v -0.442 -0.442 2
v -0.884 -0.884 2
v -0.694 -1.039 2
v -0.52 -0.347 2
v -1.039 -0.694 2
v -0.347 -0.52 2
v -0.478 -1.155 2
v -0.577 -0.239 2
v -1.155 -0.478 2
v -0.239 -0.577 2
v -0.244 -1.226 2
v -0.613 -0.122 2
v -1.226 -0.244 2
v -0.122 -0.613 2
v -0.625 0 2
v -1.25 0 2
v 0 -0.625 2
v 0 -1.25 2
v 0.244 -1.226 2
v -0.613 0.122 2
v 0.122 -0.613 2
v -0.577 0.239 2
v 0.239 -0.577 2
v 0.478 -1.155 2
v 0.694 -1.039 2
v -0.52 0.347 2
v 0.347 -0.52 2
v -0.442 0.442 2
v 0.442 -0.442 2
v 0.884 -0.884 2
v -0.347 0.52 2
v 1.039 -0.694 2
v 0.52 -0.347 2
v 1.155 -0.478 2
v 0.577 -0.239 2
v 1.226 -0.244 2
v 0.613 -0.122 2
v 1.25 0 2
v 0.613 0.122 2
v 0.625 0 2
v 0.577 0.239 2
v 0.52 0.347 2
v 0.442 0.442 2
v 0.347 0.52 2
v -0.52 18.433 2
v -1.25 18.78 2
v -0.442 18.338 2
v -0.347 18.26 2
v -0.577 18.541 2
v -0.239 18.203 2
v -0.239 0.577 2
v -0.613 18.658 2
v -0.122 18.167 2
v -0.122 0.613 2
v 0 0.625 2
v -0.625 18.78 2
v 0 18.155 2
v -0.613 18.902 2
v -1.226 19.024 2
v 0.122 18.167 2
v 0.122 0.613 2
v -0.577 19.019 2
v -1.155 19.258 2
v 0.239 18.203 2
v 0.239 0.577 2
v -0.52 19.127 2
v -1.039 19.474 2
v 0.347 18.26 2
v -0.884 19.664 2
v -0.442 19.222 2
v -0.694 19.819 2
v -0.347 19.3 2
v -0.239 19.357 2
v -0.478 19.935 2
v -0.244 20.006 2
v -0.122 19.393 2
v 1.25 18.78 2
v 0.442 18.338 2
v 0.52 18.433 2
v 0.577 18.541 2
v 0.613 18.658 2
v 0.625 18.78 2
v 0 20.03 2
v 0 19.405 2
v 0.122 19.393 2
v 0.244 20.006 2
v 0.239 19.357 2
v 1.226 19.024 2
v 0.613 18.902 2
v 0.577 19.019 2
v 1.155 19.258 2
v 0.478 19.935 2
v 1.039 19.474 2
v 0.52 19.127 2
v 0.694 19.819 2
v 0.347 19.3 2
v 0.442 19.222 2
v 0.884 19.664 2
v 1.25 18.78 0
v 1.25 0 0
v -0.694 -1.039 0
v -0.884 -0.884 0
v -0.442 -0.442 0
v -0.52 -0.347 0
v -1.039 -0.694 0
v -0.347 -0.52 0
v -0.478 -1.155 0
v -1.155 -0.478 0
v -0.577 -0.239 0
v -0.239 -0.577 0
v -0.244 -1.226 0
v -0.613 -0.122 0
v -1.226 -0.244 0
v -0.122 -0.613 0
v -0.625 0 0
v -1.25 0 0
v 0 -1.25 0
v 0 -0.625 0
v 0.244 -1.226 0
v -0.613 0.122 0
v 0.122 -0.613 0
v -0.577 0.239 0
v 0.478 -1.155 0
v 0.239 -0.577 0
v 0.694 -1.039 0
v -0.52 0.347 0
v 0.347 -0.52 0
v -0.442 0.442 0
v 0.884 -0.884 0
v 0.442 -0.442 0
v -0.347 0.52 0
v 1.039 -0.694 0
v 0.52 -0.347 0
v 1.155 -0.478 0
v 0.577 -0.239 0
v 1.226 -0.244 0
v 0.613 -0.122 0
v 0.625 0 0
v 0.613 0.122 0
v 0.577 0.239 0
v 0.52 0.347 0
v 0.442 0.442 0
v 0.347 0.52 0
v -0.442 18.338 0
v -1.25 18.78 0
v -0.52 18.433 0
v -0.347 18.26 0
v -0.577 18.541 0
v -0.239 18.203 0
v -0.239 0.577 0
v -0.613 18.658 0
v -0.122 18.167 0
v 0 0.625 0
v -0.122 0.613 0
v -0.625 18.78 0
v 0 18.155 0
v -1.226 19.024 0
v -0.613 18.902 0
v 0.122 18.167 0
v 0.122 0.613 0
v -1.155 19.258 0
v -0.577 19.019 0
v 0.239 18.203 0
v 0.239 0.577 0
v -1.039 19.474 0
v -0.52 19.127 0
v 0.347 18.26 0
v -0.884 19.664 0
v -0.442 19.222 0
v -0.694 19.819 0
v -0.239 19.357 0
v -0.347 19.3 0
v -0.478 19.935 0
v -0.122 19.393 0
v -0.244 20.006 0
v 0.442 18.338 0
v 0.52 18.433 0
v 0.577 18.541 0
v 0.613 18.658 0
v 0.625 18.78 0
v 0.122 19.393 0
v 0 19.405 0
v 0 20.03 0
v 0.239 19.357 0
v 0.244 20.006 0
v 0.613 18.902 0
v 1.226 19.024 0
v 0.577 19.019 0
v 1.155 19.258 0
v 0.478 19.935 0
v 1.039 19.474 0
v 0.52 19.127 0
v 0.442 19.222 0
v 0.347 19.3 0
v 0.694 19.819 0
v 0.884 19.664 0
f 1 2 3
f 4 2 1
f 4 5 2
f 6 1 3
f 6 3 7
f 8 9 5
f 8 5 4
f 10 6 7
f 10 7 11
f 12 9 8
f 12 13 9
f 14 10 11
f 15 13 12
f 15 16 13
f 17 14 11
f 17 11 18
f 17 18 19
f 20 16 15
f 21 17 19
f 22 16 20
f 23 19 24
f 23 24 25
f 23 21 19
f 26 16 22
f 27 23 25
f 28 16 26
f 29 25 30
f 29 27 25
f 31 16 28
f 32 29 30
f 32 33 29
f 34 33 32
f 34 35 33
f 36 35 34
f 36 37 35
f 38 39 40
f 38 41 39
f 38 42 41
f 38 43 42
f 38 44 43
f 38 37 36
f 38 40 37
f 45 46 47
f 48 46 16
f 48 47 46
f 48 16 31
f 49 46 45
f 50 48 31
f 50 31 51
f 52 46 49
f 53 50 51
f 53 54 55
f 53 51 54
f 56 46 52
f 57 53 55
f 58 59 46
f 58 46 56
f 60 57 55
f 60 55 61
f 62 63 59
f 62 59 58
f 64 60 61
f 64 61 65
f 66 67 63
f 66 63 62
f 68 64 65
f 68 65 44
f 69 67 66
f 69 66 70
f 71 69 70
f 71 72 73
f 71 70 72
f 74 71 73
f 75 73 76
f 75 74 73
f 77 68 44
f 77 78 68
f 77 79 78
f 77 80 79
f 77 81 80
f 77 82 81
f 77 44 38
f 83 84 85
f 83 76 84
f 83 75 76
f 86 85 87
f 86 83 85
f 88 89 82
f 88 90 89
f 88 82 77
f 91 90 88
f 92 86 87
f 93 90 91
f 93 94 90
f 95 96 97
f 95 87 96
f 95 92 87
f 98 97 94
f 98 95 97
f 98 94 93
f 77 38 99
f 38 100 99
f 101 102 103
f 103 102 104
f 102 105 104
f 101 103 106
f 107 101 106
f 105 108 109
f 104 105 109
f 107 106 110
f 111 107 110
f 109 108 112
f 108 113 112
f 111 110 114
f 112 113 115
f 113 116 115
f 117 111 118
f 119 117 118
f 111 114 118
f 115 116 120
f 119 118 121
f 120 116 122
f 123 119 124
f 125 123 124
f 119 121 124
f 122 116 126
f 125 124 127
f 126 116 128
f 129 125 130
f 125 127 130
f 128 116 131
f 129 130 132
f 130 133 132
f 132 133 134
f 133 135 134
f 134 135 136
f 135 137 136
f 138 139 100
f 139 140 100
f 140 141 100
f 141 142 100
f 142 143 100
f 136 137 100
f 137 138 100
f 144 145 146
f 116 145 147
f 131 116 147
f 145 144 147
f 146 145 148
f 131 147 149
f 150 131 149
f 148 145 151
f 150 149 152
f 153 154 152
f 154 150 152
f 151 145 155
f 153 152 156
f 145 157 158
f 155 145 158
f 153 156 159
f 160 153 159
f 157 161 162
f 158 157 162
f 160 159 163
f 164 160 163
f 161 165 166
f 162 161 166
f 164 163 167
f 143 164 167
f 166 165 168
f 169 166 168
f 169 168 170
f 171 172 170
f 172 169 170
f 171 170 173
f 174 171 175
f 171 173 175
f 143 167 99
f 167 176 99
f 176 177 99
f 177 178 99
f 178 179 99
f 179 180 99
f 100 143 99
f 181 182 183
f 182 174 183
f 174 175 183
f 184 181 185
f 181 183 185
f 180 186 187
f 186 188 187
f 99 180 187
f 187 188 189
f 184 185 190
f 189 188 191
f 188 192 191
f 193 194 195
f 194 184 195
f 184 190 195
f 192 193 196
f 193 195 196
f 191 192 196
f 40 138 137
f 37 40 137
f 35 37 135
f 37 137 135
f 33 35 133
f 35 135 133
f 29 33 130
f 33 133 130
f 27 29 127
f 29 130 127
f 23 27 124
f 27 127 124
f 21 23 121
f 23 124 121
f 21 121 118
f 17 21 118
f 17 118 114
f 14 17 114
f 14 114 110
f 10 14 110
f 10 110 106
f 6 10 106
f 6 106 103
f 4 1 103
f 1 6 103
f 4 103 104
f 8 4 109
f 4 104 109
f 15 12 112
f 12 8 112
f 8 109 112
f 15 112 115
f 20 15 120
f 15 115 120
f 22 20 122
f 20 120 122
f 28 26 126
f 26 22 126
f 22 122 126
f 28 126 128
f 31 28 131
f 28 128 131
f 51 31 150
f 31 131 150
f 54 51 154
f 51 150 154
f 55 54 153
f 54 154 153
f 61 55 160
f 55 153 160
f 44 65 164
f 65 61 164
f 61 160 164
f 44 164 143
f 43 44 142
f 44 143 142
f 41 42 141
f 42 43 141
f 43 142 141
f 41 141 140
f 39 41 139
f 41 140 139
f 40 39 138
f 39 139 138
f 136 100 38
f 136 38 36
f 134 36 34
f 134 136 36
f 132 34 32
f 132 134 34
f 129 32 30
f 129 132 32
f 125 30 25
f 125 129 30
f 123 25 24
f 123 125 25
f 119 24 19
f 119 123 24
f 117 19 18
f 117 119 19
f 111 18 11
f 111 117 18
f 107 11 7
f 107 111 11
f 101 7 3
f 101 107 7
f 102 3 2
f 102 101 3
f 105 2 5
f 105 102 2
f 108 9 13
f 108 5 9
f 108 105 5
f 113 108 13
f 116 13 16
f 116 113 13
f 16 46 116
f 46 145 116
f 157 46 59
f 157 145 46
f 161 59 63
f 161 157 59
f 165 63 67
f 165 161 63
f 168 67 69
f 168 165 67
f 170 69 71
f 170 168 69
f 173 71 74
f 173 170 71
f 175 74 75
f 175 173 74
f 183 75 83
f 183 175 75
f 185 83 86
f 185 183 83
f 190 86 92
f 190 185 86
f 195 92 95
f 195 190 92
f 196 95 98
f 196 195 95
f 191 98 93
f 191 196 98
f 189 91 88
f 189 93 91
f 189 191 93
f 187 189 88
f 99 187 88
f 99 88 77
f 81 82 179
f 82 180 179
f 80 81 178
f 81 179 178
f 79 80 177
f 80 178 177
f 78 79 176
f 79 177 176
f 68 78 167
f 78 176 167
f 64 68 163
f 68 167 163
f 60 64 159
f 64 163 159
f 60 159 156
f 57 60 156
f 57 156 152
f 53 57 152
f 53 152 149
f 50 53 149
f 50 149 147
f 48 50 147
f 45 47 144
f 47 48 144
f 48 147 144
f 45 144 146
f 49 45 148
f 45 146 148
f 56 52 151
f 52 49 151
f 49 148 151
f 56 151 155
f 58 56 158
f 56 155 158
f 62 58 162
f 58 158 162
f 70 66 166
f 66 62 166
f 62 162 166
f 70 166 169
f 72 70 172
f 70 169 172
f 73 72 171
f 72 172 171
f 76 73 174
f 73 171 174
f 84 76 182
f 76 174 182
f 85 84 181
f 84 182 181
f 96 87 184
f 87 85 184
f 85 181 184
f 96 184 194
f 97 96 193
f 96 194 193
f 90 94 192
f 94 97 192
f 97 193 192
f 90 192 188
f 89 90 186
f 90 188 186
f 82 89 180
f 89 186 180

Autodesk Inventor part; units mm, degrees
ref_plane "YZ Plane" through (0, 0, 0) normal (1, 0, 0) x (0, 1, 0)
ref_plane "XZ Plane" through (0, 0, 0) normal (0, 1, 0) x (-1, 0, 0)
ref_plane "XY Plane" through (0, 0, 0) normal (0, 0, 1) x (1, 0, 0)
sketch "草圖1" plane through (0, 0, 0) normal (0, 0, 1) x (1, 0, 0)
  line L0 (0, 0) -> (0, 18.78) construction
  line L1 (1.25, 0) -> (1.25, 18.78)
  line L2 (-1.25, 18.78) -> (-1.25, 0)
  arc A0 (-1.25, 0) -> (1.25, 0) centre (0, 0) ccw
  arc A1 (1.25, 18.78) -> (-1.25, 18.78) centre (0, 18.78) ccw
  circle A2 centre (0, 18.78) radius 0.625
  circle A3 centre (0, 0) radius 0.625
  point P0 (0, 9.39)
  dimension "d0" = 18.78
  dimension "d1" = 2.5
  dimension "d2" = 1.25
  dimension "d3" = 1.25
extrude "擠出1" add sketch "草圖1" along normal blind 2
properties part number "1"
